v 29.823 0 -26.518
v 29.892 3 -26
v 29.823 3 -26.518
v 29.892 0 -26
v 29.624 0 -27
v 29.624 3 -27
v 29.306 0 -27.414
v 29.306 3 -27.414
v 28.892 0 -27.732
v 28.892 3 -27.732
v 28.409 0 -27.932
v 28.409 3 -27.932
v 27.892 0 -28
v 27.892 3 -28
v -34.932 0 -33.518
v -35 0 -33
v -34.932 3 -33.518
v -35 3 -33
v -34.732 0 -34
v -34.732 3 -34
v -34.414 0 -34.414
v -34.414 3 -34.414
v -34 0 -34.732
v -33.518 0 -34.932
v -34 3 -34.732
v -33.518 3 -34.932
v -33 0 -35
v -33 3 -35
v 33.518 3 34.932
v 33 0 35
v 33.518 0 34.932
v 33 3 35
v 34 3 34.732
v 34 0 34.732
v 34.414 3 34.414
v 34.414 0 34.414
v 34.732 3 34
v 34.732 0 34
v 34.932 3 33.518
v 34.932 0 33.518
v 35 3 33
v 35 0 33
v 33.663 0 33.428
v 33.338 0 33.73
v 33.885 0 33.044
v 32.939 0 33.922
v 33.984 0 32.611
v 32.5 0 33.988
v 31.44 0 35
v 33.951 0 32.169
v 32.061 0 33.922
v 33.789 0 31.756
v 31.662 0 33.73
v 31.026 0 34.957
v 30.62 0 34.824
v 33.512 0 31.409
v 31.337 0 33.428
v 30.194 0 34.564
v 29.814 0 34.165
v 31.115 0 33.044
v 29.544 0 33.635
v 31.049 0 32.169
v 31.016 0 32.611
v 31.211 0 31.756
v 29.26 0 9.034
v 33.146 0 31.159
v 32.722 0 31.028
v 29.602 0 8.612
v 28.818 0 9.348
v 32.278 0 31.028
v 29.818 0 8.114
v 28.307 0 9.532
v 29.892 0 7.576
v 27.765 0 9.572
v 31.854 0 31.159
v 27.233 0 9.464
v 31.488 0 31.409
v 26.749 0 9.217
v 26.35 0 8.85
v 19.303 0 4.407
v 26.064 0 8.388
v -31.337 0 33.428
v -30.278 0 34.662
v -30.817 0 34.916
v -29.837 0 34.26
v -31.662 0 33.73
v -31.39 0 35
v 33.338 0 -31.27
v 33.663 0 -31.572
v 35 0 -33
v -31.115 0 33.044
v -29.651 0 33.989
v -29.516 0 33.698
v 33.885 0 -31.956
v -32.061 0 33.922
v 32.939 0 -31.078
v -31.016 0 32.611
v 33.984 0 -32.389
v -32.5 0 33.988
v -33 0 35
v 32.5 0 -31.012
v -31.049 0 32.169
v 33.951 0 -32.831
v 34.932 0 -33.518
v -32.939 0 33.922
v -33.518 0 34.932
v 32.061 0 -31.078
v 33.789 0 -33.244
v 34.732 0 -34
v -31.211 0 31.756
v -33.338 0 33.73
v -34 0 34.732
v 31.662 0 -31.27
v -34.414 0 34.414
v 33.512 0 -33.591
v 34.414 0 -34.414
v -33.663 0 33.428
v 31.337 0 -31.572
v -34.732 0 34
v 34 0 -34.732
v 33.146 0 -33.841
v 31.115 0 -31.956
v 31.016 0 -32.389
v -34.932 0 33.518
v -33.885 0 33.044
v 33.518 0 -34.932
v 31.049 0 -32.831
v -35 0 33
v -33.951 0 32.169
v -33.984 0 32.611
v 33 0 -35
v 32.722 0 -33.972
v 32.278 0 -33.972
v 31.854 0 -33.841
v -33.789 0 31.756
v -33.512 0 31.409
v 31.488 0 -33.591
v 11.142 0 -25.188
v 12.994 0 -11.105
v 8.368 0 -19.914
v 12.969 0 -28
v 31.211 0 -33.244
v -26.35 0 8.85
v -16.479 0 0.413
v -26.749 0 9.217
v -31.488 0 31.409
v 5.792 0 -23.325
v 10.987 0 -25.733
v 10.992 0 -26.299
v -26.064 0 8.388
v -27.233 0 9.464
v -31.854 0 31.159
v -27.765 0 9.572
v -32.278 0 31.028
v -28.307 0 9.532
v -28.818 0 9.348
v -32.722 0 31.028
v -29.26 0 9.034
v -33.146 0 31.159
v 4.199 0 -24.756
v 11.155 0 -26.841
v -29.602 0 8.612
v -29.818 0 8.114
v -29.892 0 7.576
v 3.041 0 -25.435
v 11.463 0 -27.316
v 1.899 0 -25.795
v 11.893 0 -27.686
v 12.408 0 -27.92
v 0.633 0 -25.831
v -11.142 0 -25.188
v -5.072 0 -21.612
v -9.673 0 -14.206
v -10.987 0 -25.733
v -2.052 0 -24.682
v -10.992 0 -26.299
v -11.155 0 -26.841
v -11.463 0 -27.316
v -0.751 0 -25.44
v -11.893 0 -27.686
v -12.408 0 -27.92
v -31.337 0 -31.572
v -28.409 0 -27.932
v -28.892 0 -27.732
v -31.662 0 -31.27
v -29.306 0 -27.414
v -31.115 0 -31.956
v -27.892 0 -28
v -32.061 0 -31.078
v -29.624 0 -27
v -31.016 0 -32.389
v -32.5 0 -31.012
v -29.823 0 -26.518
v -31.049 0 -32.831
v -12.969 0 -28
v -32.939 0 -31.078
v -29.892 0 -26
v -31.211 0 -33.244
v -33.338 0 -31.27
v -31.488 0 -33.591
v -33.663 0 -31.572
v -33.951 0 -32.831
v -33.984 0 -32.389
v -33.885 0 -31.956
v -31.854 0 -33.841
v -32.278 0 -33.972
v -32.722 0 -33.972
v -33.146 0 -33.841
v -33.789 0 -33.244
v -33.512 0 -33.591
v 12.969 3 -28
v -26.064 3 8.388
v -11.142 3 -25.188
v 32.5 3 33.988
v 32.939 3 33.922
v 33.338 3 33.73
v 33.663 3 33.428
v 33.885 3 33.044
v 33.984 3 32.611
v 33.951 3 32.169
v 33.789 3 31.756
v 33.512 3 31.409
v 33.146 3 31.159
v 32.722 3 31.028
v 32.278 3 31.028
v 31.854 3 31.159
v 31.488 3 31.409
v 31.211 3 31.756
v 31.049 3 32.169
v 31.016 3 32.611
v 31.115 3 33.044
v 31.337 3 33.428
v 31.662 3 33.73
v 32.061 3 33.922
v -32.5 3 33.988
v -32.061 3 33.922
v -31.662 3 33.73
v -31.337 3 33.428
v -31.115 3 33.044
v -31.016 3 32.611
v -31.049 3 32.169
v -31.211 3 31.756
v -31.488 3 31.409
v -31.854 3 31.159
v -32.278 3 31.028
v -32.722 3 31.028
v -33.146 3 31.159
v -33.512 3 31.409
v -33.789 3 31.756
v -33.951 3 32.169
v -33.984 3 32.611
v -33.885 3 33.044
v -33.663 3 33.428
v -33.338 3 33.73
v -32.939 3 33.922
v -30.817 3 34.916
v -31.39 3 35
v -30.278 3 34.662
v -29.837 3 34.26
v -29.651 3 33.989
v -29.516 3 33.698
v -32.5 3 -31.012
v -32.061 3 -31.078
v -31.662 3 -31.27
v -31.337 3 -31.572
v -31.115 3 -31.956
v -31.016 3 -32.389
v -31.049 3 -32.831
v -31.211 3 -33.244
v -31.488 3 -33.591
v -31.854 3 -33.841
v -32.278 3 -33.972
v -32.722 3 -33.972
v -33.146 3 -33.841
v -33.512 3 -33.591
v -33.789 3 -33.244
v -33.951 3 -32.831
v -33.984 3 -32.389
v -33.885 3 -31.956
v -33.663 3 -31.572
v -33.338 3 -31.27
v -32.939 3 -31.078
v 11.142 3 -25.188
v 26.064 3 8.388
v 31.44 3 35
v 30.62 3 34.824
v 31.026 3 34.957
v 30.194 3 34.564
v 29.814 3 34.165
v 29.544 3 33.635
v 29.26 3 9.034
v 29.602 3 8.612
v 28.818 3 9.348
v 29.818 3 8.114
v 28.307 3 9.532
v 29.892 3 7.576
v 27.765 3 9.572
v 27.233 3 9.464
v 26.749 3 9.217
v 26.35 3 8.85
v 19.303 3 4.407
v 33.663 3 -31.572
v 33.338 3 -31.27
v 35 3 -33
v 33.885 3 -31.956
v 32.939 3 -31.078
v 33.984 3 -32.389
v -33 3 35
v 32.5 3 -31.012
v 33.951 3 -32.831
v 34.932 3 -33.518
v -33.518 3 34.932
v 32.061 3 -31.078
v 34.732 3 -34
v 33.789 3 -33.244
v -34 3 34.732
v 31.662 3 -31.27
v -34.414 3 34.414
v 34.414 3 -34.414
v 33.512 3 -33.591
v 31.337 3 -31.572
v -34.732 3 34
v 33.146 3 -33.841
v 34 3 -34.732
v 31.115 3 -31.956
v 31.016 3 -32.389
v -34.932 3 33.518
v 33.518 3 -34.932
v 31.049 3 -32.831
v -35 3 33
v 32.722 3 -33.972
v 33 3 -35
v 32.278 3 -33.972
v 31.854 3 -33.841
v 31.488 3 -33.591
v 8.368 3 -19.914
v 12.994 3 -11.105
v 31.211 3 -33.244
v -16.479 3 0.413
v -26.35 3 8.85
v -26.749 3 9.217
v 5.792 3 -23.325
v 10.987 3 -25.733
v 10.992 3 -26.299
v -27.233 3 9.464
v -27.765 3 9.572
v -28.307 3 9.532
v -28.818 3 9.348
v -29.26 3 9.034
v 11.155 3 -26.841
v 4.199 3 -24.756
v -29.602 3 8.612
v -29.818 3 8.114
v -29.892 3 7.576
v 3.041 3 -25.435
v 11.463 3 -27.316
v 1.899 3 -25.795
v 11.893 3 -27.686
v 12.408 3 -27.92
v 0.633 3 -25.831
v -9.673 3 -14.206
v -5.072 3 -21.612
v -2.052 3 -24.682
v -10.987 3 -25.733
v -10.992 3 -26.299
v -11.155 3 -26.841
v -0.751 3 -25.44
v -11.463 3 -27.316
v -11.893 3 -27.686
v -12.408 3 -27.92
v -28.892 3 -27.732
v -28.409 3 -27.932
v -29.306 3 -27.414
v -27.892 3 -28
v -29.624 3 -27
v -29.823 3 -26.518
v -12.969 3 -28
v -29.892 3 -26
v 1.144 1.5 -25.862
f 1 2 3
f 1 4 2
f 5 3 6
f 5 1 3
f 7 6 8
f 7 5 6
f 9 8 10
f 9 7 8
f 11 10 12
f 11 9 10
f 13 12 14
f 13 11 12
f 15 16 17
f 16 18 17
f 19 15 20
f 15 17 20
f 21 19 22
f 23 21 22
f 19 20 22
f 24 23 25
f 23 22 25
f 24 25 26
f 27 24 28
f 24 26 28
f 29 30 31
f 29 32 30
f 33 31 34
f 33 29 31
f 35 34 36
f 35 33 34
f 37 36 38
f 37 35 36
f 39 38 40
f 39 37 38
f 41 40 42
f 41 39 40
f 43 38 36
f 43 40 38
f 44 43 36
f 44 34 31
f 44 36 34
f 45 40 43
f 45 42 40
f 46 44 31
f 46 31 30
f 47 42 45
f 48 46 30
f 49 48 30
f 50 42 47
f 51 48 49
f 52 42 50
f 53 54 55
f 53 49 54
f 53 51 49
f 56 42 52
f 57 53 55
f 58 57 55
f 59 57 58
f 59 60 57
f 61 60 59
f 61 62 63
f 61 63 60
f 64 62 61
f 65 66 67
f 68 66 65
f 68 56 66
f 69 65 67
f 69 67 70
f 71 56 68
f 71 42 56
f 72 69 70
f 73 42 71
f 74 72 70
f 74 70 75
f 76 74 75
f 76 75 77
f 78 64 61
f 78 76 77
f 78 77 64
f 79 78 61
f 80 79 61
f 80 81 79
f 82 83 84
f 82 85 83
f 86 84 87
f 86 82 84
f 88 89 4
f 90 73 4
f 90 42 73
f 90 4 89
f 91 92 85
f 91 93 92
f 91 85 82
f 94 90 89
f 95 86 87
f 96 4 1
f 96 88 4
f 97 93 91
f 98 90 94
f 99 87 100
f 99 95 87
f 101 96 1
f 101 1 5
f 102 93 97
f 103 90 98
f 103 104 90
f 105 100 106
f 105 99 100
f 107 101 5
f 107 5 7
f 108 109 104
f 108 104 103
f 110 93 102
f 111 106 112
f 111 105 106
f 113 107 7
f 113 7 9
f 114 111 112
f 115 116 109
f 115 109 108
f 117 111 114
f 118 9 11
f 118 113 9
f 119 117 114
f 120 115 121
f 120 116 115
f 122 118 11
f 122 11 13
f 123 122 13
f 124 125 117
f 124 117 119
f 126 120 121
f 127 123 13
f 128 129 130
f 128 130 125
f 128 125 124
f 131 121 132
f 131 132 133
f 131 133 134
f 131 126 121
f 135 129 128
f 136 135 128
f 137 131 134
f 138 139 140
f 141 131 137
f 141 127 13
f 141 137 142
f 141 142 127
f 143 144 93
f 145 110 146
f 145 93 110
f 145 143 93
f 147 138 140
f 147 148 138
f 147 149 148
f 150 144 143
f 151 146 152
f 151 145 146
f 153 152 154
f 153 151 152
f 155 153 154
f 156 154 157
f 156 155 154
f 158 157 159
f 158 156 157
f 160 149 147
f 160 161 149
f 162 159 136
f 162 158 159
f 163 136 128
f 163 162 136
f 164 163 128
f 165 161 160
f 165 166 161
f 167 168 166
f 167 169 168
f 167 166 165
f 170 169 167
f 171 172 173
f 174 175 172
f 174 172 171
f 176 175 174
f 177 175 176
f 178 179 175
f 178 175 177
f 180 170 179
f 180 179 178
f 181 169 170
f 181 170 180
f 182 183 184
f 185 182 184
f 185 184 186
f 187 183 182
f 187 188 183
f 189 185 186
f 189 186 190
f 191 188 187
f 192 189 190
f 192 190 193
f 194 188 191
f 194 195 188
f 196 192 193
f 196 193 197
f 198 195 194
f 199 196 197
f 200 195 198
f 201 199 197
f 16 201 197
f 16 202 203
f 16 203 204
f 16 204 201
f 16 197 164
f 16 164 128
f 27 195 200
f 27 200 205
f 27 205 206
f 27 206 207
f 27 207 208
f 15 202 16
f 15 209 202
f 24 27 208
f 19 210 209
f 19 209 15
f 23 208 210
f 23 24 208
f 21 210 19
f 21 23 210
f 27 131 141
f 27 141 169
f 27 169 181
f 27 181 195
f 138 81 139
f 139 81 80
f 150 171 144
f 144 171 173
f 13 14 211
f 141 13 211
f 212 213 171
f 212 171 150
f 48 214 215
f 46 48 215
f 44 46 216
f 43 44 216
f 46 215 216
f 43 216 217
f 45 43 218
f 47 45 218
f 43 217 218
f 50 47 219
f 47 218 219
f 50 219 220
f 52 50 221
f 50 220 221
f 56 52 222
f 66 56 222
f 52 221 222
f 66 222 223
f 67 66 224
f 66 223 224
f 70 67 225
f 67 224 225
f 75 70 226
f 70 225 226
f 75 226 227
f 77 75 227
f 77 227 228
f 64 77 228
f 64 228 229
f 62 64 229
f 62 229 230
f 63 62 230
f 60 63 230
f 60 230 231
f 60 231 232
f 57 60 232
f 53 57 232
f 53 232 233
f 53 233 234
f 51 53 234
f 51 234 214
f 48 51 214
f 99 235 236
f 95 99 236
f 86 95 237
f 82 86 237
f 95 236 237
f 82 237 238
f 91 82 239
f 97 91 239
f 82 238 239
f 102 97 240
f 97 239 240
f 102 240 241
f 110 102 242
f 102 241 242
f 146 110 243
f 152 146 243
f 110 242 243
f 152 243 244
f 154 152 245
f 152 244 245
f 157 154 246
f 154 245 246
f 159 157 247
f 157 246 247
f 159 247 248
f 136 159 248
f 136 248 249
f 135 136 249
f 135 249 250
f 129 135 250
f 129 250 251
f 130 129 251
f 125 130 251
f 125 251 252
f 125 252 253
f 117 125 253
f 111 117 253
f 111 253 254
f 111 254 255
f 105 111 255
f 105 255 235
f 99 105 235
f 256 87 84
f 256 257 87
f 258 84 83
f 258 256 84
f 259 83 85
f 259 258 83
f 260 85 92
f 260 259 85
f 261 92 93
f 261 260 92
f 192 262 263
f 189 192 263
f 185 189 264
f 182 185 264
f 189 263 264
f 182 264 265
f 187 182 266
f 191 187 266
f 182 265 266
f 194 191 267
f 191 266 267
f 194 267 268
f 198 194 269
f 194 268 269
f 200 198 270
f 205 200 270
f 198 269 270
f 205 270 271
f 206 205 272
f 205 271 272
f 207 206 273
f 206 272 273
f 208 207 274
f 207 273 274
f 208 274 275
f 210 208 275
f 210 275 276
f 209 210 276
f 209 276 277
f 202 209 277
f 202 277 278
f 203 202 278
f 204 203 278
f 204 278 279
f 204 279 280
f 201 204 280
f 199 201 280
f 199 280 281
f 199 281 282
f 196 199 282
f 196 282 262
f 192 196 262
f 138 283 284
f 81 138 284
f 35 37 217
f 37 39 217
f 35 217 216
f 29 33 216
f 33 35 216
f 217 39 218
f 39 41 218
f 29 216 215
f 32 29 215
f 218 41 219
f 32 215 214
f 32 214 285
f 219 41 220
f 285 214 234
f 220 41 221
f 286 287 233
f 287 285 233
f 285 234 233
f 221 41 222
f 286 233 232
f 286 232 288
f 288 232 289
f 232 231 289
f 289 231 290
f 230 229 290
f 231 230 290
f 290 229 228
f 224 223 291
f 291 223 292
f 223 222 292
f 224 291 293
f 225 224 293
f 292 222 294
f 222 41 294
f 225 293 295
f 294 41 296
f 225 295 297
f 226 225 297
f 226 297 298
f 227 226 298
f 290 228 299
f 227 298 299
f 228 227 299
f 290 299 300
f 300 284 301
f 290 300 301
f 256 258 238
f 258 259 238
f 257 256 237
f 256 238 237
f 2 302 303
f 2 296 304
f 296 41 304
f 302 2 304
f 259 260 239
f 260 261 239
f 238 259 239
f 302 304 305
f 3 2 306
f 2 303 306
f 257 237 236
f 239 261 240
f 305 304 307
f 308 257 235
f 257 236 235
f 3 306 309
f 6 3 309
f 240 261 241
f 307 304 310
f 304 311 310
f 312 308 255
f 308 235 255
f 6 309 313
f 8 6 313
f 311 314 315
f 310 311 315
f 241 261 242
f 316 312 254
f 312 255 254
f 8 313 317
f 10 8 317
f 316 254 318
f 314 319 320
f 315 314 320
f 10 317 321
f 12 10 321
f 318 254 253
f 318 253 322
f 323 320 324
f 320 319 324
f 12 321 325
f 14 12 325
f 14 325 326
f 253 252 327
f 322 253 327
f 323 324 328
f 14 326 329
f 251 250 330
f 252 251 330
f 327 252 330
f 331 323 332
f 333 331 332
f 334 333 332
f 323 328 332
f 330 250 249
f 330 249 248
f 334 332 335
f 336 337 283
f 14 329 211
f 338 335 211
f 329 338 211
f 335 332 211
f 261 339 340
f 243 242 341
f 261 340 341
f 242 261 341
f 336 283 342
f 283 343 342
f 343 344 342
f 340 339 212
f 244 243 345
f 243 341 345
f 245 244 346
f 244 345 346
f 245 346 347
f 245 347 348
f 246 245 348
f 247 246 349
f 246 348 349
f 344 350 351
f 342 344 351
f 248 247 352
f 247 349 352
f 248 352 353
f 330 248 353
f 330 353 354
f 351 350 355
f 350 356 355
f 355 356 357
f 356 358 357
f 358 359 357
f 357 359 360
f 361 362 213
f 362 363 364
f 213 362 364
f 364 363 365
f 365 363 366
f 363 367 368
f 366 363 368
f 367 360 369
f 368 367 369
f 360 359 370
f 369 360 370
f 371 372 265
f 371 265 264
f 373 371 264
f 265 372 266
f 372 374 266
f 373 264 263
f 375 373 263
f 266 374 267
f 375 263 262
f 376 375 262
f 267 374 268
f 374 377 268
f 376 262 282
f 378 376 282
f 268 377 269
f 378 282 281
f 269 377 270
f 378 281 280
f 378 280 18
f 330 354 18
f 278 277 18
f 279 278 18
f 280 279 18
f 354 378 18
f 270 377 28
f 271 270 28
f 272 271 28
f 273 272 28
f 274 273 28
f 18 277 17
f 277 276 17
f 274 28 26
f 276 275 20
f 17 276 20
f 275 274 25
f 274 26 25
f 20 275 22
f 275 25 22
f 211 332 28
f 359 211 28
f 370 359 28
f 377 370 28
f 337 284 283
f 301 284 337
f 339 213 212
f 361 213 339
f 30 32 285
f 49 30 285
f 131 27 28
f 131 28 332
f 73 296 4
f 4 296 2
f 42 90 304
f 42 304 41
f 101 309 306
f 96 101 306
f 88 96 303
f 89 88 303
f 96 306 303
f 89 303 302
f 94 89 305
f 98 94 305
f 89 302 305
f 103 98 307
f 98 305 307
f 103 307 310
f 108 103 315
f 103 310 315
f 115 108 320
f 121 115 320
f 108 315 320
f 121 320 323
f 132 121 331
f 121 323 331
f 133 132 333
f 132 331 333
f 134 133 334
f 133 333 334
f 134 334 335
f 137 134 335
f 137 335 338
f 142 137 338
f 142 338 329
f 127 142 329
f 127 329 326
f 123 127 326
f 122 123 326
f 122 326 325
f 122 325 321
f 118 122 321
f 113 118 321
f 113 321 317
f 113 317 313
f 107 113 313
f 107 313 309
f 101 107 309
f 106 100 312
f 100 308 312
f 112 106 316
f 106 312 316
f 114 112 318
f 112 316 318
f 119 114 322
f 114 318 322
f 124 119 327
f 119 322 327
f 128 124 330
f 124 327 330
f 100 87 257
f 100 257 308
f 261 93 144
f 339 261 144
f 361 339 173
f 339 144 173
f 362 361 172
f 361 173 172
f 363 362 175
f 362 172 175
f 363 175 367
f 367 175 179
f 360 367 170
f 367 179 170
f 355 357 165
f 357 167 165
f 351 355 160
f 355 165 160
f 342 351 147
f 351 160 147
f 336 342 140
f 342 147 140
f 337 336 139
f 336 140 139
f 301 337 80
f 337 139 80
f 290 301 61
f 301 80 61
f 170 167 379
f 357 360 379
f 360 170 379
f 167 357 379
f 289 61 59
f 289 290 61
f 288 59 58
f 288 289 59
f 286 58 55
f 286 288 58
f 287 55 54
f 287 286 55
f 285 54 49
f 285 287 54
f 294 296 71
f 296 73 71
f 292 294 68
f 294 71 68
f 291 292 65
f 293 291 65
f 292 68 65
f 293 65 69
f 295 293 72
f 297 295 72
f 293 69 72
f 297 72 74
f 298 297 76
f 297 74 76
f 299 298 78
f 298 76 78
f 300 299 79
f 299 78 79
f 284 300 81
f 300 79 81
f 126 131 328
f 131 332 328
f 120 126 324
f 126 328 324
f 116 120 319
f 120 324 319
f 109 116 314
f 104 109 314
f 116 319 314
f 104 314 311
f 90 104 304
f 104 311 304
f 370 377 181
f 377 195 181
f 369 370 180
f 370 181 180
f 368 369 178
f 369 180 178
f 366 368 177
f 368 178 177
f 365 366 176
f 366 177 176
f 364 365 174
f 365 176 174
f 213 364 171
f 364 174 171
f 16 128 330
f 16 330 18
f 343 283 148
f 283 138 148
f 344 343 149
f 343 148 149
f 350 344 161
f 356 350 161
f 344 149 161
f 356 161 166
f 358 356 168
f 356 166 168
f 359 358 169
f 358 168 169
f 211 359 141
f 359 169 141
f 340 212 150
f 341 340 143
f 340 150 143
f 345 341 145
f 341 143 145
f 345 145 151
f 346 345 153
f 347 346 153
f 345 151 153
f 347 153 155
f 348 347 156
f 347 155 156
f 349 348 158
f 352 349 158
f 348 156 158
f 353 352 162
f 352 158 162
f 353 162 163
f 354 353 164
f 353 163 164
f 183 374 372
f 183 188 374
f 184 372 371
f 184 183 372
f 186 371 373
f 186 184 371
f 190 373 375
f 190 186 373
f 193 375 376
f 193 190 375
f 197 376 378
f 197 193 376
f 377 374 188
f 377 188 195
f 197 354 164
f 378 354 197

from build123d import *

# Parameters (mm, degrees)
BOSS_EXTRUDE1_DEPTH = 3
SKETCH3_R           = 1.488133846
CUT_EXTRUDE1_DEPTH  = 50.58830522
FILLET1_R           = 2
CUT_EXTRUDE2_DEPTH  = 50.58830522
FILLET2_R           = 2


with BuildPart() as part:
    # Sketch2 → Boss-Extrude1 (new body)
    with BuildSketch(Plane(origin=(0, 0, 0), x_dir=(1, 0, 0), z_dir=(0, 1, 0))):
        with BuildLine():
            Line((-30, -35), (-35, -35))
            Line((-35, -35), (-35, 35))
            Line((-35, 35), (35, 35))
            Line((35, 35), (35, -35))
            Line((35, -35), (30, -35))
            add(Edge.make_bspline(
                [(-30, -35), (1.60249835, 50.081530709), (30, -35)],
                knots=[0, 0, 0, 1, 1, 1], degree=2, weights=[1, 2.512958679, 1]))
        make_face()
    extrude(amount=BOSS_EXTRUDE1_DEPTH)

    # Sketch3 → Cut-Extrude1 (cut, through all)
    with BuildSketch(Plane(origin=(0, 3, 0), x_dir=(1, 0, 0), z_dir=(0, 1, 0))):
        with Locations(Location((-32.5, 32.5, 0), (0, 0, 270))):
            Circle(SKETCH3_R)
        with Locations(Location((32.5, 32.5, 0), (0, 0, 270))):
            Circle(SKETCH3_R)
        with Locations(Location((32.5, -32.5, 0), (0, 0, 270))):
            Circle(SKETCH3_R)
        with Locations(Location((-32.5, -32.5, 0), (0, 0, 270))):
            Circle(SKETCH3_R)
    extrude(amount=-CUT_EXTRUDE1_DEPTH, mode=Mode.SUBTRACT)

    # Fillet1
    fillet1_edges = [part.edges().sort_by_distance(p)[0] for p in [
        (35, 1.5, 35),
        (30, 1.5, 35),
        (-30, 1.5, 35),
        (-35, 1.5, 35),
        (-35, 1.5, -35),
        (35, 1.5, -35),
    ]]
    fillet(fillet1_edges, radius=FILLET1_R)

    # Sketch4 → Cut-Extrude2 (cut, through all)
    with BuildSketch(Plane(origin=(0, 3, 0), x_dir=(1, 0, 0), z_dir=(0, 1, 0))):
        Polygon((-29.891619327, -17), (-29.891619327, 28), (-9.891619327, 28), align=None)
        Polygon((29.891619327, -17), (29.891619327, 28), (9.891619327, 28), align=None)
    extrude(amount=-CUT_EXTRUDE2_DEPTH, mode=Mode.SUBTRACT)

    # Fillet2
    fillet2_edges = [part.edges().sort_by_distance(p)[0] for p in [
        (-9.891619327, 1.5, -28),
        (-29.891619327, 1.5, 17),
        (-29.891619327, 1.5, -28),
        (29.891619327, 1.5, 17),
        (9.891619327, 1.5, -28),
        (29.891619327, 1.5, -28),
    ]]
    fillet(fillet2_edges, radius=FILLET2_R)


solid = part.part
